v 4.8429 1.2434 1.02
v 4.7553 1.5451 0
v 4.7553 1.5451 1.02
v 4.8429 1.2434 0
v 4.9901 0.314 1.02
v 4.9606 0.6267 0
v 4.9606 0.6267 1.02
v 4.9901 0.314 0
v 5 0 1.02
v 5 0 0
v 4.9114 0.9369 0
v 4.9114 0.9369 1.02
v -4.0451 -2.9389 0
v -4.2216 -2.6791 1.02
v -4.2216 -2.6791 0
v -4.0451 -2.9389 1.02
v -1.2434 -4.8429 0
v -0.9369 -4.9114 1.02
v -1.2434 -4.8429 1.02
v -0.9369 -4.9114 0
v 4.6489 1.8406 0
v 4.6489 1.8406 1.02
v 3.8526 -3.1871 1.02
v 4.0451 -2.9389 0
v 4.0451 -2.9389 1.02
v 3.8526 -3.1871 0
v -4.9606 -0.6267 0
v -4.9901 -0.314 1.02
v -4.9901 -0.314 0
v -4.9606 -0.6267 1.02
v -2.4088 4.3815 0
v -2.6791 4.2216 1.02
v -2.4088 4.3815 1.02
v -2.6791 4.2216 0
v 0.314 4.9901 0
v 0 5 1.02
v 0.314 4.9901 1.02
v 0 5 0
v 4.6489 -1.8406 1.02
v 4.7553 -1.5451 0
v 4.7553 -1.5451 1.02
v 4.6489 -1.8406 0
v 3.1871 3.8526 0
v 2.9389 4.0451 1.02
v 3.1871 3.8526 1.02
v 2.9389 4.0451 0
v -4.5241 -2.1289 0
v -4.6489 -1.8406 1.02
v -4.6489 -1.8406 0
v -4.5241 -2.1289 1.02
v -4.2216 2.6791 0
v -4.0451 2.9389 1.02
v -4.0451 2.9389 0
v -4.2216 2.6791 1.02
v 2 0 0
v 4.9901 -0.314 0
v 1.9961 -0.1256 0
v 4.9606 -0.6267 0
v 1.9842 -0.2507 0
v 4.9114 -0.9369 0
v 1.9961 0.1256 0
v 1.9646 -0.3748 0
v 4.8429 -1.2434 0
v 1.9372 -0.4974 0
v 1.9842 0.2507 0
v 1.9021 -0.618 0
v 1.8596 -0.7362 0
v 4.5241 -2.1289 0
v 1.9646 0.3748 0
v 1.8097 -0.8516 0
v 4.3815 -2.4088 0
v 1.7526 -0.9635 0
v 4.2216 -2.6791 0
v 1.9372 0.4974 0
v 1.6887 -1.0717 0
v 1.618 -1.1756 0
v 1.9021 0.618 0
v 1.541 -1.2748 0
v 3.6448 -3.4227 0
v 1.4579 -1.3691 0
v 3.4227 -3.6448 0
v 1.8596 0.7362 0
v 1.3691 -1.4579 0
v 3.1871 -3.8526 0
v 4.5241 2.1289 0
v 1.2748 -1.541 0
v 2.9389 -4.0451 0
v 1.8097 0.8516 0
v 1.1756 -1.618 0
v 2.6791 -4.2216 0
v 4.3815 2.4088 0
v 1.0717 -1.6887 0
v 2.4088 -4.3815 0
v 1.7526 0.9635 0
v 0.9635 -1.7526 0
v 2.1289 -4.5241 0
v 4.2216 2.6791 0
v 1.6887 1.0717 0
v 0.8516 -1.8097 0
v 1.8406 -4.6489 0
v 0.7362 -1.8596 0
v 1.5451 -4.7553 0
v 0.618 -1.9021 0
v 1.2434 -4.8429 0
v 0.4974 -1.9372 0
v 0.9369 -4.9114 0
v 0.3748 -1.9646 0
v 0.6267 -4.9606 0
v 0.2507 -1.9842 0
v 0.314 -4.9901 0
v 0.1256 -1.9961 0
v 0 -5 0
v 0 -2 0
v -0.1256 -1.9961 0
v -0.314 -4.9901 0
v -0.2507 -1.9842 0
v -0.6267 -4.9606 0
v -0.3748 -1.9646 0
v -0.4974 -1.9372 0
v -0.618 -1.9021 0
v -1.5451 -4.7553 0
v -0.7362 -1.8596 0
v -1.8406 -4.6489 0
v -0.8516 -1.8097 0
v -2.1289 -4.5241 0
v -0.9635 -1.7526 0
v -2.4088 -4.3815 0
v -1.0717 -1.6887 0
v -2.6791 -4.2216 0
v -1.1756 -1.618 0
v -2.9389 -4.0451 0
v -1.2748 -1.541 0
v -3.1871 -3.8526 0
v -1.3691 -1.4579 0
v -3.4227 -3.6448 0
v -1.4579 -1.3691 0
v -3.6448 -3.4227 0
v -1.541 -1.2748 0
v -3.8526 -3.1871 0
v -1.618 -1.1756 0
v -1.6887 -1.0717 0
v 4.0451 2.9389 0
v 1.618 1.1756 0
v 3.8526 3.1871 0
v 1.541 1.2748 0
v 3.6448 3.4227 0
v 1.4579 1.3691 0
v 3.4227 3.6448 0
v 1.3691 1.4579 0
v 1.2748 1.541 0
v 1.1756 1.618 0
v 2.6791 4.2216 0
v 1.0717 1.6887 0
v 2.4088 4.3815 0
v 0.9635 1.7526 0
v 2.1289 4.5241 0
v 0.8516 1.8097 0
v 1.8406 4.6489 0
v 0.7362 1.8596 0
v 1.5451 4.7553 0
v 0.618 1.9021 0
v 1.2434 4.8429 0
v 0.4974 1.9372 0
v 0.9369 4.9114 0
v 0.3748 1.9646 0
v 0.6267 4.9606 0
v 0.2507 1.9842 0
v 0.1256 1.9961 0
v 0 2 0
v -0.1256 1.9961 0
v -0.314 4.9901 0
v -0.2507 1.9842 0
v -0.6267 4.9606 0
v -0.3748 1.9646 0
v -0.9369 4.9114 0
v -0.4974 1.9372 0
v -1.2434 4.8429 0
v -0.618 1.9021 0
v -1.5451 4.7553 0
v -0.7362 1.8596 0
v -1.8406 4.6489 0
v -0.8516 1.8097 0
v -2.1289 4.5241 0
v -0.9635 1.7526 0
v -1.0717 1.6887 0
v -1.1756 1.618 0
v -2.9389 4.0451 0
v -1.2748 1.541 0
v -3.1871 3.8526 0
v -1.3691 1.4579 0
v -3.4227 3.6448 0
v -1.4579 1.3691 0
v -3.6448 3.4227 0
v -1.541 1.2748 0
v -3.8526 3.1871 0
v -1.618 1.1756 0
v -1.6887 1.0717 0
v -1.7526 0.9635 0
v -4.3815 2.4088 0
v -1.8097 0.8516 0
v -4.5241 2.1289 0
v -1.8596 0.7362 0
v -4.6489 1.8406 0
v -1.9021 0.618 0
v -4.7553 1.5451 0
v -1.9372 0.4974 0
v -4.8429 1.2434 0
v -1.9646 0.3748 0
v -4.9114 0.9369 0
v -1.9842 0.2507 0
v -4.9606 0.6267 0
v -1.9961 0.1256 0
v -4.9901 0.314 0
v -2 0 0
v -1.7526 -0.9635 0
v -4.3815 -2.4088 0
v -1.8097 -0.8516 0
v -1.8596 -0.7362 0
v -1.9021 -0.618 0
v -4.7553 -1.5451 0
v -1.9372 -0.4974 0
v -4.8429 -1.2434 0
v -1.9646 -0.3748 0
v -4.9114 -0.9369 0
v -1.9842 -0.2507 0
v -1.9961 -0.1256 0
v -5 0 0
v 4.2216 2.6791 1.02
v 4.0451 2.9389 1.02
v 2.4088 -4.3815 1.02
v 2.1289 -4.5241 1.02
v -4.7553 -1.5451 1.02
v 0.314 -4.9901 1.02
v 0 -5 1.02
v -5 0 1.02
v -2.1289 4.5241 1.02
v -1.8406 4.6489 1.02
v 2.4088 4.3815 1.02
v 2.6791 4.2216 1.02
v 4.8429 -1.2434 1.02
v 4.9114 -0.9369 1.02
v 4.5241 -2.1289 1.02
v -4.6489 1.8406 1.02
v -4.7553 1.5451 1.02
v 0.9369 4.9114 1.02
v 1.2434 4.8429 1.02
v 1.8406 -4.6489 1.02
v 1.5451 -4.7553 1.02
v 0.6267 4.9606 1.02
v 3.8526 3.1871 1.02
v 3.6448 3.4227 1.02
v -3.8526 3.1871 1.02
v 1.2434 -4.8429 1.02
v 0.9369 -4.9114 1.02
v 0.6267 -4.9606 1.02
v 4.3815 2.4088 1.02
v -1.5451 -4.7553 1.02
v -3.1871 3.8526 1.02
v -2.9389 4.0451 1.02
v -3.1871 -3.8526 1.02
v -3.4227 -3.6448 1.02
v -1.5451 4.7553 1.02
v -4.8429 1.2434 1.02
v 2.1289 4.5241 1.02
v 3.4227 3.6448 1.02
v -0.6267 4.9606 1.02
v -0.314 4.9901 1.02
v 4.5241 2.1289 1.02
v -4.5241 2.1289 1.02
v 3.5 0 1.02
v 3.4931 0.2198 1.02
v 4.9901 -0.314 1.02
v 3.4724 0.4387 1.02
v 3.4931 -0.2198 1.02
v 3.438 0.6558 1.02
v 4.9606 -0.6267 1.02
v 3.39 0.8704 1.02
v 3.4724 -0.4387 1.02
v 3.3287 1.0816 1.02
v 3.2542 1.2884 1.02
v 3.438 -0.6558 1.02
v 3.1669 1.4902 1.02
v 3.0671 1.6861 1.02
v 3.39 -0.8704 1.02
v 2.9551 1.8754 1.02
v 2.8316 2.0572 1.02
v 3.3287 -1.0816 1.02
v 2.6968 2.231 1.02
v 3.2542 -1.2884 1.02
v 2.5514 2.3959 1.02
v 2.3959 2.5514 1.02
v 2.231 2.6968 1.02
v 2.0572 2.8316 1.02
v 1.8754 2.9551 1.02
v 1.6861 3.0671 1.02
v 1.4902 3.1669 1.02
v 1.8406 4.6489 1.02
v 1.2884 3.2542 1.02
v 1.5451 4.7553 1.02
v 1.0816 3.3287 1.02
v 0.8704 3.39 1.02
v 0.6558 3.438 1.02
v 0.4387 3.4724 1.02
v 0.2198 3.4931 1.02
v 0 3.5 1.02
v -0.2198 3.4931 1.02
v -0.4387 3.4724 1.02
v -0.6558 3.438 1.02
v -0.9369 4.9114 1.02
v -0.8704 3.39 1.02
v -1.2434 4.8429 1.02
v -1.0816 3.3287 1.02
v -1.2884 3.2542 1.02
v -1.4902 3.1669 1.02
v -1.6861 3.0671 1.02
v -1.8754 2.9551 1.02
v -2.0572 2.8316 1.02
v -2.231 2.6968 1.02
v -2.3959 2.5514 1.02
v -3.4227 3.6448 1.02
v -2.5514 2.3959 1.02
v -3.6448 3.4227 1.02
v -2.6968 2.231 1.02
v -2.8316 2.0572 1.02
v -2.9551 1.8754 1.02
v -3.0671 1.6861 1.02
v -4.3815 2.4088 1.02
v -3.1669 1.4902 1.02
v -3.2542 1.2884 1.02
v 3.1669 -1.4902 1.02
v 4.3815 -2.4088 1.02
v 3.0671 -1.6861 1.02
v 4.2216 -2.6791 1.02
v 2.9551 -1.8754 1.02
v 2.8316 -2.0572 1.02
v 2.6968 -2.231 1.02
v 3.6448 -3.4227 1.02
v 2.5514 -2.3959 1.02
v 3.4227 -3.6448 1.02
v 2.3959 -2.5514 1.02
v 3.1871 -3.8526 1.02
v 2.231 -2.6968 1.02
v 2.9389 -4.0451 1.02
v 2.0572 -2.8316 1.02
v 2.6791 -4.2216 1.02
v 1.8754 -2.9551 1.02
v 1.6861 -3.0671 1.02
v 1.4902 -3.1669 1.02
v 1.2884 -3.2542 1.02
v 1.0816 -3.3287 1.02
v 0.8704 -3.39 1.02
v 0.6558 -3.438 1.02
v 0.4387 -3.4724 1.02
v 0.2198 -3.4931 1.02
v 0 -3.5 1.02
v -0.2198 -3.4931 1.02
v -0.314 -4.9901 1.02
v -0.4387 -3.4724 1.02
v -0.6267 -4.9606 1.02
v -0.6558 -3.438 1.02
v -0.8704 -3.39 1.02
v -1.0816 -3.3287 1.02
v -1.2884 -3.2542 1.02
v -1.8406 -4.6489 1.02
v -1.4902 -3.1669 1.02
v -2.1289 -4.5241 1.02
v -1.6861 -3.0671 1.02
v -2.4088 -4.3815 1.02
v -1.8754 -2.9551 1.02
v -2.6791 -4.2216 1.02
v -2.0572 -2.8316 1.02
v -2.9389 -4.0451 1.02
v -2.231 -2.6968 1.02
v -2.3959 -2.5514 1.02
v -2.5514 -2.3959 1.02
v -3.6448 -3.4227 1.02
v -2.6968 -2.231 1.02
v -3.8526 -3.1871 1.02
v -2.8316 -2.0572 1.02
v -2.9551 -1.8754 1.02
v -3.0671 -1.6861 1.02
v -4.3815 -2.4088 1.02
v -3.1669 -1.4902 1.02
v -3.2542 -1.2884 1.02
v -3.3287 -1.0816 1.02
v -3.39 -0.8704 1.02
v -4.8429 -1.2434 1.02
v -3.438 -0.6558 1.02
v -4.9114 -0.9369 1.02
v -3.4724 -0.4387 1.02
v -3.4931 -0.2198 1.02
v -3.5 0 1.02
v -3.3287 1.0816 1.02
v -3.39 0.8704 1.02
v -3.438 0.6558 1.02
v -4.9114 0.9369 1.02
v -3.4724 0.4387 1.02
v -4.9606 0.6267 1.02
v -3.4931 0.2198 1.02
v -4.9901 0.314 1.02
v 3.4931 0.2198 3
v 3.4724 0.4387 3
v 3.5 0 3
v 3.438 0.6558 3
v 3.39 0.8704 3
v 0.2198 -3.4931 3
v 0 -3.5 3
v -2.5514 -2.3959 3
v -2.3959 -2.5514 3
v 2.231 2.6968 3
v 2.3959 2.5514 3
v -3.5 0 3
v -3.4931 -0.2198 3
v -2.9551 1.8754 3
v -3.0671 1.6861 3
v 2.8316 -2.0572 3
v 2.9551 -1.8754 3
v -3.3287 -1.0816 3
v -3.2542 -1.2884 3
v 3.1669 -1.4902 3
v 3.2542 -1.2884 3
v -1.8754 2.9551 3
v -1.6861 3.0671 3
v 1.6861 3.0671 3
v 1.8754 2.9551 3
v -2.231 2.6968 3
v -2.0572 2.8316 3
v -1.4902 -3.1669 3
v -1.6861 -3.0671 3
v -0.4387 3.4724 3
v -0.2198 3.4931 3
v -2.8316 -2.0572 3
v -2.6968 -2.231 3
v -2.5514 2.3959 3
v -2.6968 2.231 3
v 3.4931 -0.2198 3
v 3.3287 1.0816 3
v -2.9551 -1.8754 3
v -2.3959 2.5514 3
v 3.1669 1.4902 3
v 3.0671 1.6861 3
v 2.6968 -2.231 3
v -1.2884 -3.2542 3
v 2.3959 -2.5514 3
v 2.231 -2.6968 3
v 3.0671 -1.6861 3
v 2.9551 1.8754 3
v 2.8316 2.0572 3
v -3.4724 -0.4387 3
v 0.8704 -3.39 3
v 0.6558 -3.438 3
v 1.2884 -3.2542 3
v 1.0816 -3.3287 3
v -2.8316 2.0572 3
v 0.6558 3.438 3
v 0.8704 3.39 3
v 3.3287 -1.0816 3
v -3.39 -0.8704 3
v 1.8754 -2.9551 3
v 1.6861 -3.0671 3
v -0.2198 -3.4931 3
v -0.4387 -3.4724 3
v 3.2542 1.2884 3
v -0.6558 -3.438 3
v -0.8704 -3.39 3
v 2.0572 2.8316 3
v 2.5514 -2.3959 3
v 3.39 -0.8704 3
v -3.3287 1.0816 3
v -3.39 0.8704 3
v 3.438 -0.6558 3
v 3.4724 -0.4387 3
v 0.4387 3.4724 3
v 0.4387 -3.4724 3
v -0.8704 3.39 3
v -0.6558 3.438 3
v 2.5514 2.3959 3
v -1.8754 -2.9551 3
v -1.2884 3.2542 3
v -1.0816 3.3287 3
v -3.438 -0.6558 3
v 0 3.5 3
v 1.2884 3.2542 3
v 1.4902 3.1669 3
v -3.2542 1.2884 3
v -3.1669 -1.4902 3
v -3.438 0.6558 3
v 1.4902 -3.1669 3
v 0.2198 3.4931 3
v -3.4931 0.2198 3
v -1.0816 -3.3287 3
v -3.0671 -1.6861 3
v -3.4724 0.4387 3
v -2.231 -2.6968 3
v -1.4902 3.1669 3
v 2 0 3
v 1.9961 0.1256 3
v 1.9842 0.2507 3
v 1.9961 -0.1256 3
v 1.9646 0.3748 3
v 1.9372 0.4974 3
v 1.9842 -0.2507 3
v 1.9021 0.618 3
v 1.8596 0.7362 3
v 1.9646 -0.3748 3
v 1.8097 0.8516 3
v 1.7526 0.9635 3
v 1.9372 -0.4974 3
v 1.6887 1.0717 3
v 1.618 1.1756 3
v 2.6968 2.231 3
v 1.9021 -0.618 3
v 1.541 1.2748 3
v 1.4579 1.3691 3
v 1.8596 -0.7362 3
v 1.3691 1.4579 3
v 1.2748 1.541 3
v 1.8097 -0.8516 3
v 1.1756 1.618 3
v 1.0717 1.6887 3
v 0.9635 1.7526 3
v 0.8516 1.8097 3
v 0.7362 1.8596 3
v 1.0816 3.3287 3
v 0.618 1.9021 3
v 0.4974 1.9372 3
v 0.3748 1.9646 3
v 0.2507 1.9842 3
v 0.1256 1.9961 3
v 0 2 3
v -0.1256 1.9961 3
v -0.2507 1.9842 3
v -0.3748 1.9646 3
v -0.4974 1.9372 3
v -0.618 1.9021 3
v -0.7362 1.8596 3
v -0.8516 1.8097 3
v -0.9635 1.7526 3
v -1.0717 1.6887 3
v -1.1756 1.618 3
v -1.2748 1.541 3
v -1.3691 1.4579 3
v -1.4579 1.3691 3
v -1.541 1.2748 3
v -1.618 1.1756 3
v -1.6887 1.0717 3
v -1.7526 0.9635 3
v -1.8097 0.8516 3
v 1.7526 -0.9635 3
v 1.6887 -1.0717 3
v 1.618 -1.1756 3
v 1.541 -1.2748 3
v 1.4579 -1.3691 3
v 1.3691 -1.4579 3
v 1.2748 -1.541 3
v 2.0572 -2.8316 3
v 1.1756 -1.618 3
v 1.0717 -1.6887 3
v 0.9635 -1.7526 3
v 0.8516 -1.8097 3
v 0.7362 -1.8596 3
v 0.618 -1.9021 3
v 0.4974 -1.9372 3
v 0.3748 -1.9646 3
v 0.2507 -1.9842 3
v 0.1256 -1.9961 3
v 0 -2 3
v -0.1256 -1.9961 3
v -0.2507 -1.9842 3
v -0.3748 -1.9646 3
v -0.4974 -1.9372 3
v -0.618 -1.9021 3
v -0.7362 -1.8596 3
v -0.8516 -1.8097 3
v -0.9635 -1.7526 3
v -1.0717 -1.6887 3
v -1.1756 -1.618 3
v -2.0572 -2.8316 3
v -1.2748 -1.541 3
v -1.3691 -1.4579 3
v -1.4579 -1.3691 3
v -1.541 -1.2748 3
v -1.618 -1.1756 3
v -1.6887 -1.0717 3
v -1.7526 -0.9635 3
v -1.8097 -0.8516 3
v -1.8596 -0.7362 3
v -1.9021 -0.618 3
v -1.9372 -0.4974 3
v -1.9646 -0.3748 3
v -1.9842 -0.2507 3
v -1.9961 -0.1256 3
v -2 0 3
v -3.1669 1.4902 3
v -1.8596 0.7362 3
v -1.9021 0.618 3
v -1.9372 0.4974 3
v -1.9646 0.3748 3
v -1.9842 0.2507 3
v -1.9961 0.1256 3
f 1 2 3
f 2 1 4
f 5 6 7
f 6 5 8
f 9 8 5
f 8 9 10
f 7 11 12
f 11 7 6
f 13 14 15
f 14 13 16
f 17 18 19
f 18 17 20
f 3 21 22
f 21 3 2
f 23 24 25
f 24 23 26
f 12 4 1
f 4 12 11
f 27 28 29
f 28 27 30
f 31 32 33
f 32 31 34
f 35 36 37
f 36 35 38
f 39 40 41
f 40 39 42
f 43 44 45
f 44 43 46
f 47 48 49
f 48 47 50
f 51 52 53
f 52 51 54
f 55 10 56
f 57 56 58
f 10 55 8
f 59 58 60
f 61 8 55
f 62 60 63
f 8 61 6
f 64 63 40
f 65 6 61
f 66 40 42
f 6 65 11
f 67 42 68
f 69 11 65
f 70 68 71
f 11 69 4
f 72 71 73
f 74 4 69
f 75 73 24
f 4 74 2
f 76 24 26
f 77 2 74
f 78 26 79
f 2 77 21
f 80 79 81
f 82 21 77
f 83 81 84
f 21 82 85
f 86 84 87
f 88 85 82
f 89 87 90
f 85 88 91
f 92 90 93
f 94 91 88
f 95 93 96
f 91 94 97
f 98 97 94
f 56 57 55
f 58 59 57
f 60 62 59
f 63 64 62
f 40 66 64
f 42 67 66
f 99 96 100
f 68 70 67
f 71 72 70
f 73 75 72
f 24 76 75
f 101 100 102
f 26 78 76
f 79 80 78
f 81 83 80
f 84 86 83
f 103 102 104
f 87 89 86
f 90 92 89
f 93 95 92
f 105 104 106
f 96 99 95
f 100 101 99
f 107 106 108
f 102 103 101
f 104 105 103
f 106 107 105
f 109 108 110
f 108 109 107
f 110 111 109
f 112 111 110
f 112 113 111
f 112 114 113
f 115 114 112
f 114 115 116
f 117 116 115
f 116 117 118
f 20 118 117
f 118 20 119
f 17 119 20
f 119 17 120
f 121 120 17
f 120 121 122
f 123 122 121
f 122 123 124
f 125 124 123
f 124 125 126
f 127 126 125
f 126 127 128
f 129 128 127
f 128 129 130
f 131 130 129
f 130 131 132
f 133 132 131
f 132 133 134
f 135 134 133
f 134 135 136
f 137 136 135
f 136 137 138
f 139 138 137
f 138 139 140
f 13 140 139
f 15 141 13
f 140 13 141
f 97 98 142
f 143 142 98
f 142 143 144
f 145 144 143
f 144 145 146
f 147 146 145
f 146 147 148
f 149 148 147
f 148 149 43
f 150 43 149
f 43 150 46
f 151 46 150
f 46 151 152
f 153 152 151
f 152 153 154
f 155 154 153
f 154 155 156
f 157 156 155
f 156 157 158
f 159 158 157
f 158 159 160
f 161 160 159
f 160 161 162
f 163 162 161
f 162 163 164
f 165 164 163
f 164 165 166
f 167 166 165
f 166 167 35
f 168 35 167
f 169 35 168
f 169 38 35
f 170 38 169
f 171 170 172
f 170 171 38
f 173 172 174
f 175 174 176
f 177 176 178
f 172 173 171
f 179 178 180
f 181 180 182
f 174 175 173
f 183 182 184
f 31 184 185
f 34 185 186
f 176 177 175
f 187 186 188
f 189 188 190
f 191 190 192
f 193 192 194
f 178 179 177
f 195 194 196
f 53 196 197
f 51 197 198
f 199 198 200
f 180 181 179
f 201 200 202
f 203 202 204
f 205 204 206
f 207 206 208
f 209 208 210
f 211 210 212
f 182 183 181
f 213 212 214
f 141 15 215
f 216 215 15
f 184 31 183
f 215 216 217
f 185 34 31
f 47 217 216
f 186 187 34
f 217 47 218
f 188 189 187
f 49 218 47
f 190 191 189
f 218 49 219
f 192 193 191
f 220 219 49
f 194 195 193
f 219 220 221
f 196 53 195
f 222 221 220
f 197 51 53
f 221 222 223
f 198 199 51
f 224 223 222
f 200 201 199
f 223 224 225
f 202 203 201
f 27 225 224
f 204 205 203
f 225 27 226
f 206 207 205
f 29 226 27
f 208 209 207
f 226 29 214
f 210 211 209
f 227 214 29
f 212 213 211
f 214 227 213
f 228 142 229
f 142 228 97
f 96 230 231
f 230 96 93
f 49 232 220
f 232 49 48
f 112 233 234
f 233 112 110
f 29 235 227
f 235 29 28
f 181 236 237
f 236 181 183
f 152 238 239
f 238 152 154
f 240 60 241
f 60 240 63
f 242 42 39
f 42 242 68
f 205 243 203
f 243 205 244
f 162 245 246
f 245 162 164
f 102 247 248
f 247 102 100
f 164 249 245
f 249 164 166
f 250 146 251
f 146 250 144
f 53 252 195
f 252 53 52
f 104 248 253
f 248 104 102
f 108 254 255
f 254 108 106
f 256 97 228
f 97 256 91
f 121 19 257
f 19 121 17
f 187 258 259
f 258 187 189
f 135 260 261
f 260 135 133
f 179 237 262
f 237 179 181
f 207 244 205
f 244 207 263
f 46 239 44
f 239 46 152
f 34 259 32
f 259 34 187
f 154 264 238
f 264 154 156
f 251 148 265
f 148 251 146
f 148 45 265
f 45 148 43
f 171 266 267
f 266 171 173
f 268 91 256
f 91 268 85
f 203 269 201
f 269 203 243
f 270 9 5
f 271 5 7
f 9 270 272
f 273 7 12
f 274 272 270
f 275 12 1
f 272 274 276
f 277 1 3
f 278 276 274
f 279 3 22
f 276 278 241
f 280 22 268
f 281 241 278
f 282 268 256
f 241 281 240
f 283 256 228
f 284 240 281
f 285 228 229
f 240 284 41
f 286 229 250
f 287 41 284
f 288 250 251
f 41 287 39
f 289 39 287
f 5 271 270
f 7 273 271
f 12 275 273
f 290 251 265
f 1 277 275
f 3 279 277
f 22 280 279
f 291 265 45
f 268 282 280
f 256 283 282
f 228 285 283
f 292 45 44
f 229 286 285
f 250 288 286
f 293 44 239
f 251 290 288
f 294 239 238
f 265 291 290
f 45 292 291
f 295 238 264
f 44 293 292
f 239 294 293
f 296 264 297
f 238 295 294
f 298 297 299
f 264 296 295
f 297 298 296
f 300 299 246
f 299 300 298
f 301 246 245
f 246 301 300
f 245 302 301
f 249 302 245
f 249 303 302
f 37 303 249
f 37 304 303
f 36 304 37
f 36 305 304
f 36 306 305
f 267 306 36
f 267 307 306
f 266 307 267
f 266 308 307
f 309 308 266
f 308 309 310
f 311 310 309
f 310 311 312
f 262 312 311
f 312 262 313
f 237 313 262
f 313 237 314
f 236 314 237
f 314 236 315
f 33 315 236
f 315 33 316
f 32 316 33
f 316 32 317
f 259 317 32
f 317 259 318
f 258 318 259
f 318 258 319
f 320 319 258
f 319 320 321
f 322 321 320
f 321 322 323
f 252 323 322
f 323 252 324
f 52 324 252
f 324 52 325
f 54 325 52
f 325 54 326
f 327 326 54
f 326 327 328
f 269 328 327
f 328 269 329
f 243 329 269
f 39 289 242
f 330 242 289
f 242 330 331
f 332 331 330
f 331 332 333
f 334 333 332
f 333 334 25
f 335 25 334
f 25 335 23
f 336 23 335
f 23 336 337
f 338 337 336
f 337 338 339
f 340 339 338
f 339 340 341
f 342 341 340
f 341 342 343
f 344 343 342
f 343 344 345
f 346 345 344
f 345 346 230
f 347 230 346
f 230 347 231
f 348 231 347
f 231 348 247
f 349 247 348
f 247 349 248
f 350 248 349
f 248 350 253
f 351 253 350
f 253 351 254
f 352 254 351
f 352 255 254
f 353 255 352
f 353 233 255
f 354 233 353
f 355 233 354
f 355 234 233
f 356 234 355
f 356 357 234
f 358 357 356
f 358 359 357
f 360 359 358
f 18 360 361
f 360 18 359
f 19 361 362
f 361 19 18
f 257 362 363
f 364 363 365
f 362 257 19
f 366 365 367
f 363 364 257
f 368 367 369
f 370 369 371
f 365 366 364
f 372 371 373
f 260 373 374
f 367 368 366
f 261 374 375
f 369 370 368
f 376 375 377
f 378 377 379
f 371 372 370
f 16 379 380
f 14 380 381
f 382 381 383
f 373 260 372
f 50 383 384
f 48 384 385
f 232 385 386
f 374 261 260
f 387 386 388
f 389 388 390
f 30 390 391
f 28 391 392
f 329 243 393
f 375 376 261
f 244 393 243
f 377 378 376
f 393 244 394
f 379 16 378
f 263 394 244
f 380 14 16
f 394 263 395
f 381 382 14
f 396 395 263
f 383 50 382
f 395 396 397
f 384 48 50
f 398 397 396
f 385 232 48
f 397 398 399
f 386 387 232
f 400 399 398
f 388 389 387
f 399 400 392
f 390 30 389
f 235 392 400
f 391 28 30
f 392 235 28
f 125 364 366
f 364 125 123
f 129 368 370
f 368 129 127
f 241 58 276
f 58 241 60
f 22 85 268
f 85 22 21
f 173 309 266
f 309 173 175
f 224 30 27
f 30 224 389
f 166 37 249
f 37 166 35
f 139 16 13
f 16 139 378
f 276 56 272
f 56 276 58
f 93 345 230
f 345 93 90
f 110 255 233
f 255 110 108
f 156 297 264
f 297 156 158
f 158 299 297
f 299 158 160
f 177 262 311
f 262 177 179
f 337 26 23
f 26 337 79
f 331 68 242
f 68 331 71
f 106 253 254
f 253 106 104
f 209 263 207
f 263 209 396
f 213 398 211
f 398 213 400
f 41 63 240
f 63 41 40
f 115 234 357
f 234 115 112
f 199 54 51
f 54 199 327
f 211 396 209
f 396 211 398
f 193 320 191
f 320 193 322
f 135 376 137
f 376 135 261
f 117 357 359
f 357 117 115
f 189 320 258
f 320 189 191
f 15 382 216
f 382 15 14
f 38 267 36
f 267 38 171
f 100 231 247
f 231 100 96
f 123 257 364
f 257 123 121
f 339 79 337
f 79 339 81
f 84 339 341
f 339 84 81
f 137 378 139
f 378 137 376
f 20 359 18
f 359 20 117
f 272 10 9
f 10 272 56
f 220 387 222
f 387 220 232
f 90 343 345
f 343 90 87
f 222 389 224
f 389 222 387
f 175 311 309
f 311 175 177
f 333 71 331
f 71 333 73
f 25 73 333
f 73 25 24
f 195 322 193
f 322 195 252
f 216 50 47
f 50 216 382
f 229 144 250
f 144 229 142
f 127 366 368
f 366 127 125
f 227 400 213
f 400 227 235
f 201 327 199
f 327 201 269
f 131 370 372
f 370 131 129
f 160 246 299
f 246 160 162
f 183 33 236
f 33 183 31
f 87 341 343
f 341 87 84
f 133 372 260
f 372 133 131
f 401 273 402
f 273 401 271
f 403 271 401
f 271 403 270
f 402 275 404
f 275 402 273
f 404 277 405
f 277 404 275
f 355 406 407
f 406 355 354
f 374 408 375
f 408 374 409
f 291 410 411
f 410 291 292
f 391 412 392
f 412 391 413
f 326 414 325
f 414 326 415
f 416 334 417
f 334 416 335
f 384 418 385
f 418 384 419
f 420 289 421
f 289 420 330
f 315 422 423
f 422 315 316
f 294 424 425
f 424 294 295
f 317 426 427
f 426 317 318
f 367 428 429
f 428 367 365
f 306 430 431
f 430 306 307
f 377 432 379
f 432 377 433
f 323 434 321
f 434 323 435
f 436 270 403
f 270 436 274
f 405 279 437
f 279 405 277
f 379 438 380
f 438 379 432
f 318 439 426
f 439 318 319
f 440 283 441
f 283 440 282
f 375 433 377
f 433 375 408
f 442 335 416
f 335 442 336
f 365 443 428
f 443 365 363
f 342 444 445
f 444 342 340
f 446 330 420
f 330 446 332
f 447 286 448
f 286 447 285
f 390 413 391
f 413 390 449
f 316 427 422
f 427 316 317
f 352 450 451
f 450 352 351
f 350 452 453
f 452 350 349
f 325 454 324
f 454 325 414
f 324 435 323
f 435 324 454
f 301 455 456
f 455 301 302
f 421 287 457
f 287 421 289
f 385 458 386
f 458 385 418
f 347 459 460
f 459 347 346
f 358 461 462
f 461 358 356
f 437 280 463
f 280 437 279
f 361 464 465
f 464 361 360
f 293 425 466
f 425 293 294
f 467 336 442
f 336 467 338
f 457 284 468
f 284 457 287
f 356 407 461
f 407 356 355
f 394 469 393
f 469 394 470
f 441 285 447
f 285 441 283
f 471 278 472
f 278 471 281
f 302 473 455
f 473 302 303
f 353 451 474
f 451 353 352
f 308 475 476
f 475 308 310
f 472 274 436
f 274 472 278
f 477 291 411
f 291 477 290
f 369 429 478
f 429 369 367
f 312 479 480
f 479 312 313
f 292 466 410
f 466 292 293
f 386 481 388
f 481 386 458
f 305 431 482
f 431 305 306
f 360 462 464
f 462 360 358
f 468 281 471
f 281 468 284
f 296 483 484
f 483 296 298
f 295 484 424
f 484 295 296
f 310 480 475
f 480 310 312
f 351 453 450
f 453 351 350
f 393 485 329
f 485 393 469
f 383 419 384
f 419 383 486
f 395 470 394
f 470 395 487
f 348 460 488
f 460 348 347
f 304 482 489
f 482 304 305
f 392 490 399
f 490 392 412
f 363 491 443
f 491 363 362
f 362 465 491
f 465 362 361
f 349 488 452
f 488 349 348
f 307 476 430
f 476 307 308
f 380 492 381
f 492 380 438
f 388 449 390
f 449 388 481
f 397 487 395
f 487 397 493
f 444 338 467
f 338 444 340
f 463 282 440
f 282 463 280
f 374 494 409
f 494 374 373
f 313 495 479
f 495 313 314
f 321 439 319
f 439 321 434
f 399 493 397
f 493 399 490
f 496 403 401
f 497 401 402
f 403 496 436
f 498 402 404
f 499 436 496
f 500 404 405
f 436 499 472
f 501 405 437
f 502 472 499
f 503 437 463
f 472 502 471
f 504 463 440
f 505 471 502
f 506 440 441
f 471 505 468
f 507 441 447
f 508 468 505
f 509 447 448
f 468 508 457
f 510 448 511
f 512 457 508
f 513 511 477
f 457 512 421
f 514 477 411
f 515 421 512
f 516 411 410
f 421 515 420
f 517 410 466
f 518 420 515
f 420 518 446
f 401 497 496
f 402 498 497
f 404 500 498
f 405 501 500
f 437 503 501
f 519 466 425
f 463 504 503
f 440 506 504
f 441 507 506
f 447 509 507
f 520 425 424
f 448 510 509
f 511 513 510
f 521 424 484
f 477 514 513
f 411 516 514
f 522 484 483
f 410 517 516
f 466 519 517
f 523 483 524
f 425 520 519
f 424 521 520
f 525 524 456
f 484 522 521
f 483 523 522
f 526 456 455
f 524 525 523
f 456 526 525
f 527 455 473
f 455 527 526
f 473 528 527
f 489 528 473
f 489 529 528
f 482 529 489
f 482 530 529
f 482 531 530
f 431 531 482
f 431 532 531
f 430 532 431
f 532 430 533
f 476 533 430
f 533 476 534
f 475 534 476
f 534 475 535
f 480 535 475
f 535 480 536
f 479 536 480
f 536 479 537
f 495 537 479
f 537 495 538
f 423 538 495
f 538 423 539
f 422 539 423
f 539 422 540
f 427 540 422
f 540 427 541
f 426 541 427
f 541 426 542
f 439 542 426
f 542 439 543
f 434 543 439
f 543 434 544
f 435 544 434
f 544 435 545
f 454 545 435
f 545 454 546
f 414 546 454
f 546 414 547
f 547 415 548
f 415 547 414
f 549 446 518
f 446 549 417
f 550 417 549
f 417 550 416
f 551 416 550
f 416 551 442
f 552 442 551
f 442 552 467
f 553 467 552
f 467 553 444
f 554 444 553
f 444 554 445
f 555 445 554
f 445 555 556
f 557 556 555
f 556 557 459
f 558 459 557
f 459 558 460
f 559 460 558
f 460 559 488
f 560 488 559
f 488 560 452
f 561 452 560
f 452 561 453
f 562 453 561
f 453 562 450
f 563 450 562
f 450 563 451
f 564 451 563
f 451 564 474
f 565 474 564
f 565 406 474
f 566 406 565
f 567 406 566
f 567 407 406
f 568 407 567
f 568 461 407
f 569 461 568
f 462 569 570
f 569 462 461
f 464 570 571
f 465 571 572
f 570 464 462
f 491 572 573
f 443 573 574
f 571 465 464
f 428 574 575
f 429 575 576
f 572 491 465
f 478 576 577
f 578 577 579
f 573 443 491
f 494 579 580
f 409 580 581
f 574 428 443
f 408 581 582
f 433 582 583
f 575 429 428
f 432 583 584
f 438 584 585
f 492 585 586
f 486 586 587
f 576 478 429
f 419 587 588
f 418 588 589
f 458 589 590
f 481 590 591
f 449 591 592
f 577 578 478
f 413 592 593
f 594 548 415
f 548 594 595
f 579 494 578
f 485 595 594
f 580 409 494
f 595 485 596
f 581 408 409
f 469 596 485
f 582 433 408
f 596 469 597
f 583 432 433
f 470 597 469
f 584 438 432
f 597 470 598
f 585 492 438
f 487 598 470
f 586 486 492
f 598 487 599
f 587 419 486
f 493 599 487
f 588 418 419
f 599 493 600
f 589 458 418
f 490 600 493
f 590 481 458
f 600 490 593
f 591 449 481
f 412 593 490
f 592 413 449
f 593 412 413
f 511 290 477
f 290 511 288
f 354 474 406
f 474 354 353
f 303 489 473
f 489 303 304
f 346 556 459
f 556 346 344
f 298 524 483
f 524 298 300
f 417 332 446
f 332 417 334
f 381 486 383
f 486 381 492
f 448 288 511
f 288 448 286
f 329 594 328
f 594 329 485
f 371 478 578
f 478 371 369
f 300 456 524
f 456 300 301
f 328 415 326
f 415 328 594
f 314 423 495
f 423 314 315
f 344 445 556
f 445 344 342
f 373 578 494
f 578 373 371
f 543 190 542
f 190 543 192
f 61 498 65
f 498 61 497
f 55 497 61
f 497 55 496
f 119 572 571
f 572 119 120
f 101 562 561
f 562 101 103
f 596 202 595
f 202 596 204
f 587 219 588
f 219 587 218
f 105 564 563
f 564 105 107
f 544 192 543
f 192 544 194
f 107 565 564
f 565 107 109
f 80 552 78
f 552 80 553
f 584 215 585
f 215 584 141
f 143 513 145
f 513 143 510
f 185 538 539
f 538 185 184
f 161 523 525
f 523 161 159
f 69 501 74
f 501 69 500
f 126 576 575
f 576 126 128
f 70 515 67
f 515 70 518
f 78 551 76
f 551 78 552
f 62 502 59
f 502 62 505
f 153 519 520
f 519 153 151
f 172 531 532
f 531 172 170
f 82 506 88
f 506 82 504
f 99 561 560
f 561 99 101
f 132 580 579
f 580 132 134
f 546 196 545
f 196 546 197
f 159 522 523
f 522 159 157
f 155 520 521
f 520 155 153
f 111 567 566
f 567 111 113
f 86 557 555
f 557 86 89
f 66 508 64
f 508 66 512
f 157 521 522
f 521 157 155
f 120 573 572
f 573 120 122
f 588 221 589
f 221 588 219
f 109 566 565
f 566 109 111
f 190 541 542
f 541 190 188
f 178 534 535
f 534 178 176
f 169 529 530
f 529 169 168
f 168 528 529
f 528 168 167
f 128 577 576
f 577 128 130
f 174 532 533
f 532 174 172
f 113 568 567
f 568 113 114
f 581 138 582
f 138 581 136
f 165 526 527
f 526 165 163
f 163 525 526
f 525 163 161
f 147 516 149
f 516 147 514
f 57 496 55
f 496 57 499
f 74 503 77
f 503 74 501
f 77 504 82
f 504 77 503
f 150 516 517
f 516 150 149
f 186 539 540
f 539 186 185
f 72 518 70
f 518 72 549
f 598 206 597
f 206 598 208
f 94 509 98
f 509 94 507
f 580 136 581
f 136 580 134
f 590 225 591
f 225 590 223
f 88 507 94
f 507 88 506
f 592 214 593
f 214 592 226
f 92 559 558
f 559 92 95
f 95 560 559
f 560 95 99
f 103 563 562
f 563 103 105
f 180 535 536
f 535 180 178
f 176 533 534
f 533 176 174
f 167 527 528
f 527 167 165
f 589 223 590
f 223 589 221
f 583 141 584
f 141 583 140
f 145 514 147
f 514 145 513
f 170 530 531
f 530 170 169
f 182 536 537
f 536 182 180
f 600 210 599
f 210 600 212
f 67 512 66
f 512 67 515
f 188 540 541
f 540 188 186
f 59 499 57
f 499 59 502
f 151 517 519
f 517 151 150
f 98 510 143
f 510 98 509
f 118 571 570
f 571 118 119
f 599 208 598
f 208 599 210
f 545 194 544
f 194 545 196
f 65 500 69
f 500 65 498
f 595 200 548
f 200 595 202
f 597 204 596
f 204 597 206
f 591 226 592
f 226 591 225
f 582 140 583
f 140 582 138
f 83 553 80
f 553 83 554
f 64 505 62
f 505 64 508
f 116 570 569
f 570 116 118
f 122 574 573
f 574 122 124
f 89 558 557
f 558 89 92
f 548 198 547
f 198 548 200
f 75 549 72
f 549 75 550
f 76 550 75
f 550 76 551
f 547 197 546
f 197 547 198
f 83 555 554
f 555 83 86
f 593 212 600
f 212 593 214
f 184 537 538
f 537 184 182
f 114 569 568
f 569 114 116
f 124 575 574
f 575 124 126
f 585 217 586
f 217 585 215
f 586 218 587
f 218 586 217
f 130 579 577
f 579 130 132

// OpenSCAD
// variables
height = 3; // [1:100]
pipe_height_in_percent = 66; // [0:100]
washer_diameter = 10; // [1:99]
pipe_diamater = 7; // [1:100]
hole = 1; // [1:Yes,0:No]
hole_diameter = 4; // [1:100]
resolution = 100; // [100:rough,150:middle,200:fine]


// model
difference(){
	union(){
		cylinder(h=height/100*(100-pipe_height_in_percent),r1=washer_diameter/2,r2=washer_diameter/2,$fn=resolution);
		translate([0,0,height/100*(100-pipe_height_in_percent)]) cylinder(h=height/100*pipe_height_in_percent,r1=pipe_diamater/2,r2=pipe_diamater/2,$fn=resolution);
	}
	if(hole==1){
		cylinder(h=height,r1=hole_diameter/2,r2=hole_diameter/2,$fn=resolution);
	}
}
